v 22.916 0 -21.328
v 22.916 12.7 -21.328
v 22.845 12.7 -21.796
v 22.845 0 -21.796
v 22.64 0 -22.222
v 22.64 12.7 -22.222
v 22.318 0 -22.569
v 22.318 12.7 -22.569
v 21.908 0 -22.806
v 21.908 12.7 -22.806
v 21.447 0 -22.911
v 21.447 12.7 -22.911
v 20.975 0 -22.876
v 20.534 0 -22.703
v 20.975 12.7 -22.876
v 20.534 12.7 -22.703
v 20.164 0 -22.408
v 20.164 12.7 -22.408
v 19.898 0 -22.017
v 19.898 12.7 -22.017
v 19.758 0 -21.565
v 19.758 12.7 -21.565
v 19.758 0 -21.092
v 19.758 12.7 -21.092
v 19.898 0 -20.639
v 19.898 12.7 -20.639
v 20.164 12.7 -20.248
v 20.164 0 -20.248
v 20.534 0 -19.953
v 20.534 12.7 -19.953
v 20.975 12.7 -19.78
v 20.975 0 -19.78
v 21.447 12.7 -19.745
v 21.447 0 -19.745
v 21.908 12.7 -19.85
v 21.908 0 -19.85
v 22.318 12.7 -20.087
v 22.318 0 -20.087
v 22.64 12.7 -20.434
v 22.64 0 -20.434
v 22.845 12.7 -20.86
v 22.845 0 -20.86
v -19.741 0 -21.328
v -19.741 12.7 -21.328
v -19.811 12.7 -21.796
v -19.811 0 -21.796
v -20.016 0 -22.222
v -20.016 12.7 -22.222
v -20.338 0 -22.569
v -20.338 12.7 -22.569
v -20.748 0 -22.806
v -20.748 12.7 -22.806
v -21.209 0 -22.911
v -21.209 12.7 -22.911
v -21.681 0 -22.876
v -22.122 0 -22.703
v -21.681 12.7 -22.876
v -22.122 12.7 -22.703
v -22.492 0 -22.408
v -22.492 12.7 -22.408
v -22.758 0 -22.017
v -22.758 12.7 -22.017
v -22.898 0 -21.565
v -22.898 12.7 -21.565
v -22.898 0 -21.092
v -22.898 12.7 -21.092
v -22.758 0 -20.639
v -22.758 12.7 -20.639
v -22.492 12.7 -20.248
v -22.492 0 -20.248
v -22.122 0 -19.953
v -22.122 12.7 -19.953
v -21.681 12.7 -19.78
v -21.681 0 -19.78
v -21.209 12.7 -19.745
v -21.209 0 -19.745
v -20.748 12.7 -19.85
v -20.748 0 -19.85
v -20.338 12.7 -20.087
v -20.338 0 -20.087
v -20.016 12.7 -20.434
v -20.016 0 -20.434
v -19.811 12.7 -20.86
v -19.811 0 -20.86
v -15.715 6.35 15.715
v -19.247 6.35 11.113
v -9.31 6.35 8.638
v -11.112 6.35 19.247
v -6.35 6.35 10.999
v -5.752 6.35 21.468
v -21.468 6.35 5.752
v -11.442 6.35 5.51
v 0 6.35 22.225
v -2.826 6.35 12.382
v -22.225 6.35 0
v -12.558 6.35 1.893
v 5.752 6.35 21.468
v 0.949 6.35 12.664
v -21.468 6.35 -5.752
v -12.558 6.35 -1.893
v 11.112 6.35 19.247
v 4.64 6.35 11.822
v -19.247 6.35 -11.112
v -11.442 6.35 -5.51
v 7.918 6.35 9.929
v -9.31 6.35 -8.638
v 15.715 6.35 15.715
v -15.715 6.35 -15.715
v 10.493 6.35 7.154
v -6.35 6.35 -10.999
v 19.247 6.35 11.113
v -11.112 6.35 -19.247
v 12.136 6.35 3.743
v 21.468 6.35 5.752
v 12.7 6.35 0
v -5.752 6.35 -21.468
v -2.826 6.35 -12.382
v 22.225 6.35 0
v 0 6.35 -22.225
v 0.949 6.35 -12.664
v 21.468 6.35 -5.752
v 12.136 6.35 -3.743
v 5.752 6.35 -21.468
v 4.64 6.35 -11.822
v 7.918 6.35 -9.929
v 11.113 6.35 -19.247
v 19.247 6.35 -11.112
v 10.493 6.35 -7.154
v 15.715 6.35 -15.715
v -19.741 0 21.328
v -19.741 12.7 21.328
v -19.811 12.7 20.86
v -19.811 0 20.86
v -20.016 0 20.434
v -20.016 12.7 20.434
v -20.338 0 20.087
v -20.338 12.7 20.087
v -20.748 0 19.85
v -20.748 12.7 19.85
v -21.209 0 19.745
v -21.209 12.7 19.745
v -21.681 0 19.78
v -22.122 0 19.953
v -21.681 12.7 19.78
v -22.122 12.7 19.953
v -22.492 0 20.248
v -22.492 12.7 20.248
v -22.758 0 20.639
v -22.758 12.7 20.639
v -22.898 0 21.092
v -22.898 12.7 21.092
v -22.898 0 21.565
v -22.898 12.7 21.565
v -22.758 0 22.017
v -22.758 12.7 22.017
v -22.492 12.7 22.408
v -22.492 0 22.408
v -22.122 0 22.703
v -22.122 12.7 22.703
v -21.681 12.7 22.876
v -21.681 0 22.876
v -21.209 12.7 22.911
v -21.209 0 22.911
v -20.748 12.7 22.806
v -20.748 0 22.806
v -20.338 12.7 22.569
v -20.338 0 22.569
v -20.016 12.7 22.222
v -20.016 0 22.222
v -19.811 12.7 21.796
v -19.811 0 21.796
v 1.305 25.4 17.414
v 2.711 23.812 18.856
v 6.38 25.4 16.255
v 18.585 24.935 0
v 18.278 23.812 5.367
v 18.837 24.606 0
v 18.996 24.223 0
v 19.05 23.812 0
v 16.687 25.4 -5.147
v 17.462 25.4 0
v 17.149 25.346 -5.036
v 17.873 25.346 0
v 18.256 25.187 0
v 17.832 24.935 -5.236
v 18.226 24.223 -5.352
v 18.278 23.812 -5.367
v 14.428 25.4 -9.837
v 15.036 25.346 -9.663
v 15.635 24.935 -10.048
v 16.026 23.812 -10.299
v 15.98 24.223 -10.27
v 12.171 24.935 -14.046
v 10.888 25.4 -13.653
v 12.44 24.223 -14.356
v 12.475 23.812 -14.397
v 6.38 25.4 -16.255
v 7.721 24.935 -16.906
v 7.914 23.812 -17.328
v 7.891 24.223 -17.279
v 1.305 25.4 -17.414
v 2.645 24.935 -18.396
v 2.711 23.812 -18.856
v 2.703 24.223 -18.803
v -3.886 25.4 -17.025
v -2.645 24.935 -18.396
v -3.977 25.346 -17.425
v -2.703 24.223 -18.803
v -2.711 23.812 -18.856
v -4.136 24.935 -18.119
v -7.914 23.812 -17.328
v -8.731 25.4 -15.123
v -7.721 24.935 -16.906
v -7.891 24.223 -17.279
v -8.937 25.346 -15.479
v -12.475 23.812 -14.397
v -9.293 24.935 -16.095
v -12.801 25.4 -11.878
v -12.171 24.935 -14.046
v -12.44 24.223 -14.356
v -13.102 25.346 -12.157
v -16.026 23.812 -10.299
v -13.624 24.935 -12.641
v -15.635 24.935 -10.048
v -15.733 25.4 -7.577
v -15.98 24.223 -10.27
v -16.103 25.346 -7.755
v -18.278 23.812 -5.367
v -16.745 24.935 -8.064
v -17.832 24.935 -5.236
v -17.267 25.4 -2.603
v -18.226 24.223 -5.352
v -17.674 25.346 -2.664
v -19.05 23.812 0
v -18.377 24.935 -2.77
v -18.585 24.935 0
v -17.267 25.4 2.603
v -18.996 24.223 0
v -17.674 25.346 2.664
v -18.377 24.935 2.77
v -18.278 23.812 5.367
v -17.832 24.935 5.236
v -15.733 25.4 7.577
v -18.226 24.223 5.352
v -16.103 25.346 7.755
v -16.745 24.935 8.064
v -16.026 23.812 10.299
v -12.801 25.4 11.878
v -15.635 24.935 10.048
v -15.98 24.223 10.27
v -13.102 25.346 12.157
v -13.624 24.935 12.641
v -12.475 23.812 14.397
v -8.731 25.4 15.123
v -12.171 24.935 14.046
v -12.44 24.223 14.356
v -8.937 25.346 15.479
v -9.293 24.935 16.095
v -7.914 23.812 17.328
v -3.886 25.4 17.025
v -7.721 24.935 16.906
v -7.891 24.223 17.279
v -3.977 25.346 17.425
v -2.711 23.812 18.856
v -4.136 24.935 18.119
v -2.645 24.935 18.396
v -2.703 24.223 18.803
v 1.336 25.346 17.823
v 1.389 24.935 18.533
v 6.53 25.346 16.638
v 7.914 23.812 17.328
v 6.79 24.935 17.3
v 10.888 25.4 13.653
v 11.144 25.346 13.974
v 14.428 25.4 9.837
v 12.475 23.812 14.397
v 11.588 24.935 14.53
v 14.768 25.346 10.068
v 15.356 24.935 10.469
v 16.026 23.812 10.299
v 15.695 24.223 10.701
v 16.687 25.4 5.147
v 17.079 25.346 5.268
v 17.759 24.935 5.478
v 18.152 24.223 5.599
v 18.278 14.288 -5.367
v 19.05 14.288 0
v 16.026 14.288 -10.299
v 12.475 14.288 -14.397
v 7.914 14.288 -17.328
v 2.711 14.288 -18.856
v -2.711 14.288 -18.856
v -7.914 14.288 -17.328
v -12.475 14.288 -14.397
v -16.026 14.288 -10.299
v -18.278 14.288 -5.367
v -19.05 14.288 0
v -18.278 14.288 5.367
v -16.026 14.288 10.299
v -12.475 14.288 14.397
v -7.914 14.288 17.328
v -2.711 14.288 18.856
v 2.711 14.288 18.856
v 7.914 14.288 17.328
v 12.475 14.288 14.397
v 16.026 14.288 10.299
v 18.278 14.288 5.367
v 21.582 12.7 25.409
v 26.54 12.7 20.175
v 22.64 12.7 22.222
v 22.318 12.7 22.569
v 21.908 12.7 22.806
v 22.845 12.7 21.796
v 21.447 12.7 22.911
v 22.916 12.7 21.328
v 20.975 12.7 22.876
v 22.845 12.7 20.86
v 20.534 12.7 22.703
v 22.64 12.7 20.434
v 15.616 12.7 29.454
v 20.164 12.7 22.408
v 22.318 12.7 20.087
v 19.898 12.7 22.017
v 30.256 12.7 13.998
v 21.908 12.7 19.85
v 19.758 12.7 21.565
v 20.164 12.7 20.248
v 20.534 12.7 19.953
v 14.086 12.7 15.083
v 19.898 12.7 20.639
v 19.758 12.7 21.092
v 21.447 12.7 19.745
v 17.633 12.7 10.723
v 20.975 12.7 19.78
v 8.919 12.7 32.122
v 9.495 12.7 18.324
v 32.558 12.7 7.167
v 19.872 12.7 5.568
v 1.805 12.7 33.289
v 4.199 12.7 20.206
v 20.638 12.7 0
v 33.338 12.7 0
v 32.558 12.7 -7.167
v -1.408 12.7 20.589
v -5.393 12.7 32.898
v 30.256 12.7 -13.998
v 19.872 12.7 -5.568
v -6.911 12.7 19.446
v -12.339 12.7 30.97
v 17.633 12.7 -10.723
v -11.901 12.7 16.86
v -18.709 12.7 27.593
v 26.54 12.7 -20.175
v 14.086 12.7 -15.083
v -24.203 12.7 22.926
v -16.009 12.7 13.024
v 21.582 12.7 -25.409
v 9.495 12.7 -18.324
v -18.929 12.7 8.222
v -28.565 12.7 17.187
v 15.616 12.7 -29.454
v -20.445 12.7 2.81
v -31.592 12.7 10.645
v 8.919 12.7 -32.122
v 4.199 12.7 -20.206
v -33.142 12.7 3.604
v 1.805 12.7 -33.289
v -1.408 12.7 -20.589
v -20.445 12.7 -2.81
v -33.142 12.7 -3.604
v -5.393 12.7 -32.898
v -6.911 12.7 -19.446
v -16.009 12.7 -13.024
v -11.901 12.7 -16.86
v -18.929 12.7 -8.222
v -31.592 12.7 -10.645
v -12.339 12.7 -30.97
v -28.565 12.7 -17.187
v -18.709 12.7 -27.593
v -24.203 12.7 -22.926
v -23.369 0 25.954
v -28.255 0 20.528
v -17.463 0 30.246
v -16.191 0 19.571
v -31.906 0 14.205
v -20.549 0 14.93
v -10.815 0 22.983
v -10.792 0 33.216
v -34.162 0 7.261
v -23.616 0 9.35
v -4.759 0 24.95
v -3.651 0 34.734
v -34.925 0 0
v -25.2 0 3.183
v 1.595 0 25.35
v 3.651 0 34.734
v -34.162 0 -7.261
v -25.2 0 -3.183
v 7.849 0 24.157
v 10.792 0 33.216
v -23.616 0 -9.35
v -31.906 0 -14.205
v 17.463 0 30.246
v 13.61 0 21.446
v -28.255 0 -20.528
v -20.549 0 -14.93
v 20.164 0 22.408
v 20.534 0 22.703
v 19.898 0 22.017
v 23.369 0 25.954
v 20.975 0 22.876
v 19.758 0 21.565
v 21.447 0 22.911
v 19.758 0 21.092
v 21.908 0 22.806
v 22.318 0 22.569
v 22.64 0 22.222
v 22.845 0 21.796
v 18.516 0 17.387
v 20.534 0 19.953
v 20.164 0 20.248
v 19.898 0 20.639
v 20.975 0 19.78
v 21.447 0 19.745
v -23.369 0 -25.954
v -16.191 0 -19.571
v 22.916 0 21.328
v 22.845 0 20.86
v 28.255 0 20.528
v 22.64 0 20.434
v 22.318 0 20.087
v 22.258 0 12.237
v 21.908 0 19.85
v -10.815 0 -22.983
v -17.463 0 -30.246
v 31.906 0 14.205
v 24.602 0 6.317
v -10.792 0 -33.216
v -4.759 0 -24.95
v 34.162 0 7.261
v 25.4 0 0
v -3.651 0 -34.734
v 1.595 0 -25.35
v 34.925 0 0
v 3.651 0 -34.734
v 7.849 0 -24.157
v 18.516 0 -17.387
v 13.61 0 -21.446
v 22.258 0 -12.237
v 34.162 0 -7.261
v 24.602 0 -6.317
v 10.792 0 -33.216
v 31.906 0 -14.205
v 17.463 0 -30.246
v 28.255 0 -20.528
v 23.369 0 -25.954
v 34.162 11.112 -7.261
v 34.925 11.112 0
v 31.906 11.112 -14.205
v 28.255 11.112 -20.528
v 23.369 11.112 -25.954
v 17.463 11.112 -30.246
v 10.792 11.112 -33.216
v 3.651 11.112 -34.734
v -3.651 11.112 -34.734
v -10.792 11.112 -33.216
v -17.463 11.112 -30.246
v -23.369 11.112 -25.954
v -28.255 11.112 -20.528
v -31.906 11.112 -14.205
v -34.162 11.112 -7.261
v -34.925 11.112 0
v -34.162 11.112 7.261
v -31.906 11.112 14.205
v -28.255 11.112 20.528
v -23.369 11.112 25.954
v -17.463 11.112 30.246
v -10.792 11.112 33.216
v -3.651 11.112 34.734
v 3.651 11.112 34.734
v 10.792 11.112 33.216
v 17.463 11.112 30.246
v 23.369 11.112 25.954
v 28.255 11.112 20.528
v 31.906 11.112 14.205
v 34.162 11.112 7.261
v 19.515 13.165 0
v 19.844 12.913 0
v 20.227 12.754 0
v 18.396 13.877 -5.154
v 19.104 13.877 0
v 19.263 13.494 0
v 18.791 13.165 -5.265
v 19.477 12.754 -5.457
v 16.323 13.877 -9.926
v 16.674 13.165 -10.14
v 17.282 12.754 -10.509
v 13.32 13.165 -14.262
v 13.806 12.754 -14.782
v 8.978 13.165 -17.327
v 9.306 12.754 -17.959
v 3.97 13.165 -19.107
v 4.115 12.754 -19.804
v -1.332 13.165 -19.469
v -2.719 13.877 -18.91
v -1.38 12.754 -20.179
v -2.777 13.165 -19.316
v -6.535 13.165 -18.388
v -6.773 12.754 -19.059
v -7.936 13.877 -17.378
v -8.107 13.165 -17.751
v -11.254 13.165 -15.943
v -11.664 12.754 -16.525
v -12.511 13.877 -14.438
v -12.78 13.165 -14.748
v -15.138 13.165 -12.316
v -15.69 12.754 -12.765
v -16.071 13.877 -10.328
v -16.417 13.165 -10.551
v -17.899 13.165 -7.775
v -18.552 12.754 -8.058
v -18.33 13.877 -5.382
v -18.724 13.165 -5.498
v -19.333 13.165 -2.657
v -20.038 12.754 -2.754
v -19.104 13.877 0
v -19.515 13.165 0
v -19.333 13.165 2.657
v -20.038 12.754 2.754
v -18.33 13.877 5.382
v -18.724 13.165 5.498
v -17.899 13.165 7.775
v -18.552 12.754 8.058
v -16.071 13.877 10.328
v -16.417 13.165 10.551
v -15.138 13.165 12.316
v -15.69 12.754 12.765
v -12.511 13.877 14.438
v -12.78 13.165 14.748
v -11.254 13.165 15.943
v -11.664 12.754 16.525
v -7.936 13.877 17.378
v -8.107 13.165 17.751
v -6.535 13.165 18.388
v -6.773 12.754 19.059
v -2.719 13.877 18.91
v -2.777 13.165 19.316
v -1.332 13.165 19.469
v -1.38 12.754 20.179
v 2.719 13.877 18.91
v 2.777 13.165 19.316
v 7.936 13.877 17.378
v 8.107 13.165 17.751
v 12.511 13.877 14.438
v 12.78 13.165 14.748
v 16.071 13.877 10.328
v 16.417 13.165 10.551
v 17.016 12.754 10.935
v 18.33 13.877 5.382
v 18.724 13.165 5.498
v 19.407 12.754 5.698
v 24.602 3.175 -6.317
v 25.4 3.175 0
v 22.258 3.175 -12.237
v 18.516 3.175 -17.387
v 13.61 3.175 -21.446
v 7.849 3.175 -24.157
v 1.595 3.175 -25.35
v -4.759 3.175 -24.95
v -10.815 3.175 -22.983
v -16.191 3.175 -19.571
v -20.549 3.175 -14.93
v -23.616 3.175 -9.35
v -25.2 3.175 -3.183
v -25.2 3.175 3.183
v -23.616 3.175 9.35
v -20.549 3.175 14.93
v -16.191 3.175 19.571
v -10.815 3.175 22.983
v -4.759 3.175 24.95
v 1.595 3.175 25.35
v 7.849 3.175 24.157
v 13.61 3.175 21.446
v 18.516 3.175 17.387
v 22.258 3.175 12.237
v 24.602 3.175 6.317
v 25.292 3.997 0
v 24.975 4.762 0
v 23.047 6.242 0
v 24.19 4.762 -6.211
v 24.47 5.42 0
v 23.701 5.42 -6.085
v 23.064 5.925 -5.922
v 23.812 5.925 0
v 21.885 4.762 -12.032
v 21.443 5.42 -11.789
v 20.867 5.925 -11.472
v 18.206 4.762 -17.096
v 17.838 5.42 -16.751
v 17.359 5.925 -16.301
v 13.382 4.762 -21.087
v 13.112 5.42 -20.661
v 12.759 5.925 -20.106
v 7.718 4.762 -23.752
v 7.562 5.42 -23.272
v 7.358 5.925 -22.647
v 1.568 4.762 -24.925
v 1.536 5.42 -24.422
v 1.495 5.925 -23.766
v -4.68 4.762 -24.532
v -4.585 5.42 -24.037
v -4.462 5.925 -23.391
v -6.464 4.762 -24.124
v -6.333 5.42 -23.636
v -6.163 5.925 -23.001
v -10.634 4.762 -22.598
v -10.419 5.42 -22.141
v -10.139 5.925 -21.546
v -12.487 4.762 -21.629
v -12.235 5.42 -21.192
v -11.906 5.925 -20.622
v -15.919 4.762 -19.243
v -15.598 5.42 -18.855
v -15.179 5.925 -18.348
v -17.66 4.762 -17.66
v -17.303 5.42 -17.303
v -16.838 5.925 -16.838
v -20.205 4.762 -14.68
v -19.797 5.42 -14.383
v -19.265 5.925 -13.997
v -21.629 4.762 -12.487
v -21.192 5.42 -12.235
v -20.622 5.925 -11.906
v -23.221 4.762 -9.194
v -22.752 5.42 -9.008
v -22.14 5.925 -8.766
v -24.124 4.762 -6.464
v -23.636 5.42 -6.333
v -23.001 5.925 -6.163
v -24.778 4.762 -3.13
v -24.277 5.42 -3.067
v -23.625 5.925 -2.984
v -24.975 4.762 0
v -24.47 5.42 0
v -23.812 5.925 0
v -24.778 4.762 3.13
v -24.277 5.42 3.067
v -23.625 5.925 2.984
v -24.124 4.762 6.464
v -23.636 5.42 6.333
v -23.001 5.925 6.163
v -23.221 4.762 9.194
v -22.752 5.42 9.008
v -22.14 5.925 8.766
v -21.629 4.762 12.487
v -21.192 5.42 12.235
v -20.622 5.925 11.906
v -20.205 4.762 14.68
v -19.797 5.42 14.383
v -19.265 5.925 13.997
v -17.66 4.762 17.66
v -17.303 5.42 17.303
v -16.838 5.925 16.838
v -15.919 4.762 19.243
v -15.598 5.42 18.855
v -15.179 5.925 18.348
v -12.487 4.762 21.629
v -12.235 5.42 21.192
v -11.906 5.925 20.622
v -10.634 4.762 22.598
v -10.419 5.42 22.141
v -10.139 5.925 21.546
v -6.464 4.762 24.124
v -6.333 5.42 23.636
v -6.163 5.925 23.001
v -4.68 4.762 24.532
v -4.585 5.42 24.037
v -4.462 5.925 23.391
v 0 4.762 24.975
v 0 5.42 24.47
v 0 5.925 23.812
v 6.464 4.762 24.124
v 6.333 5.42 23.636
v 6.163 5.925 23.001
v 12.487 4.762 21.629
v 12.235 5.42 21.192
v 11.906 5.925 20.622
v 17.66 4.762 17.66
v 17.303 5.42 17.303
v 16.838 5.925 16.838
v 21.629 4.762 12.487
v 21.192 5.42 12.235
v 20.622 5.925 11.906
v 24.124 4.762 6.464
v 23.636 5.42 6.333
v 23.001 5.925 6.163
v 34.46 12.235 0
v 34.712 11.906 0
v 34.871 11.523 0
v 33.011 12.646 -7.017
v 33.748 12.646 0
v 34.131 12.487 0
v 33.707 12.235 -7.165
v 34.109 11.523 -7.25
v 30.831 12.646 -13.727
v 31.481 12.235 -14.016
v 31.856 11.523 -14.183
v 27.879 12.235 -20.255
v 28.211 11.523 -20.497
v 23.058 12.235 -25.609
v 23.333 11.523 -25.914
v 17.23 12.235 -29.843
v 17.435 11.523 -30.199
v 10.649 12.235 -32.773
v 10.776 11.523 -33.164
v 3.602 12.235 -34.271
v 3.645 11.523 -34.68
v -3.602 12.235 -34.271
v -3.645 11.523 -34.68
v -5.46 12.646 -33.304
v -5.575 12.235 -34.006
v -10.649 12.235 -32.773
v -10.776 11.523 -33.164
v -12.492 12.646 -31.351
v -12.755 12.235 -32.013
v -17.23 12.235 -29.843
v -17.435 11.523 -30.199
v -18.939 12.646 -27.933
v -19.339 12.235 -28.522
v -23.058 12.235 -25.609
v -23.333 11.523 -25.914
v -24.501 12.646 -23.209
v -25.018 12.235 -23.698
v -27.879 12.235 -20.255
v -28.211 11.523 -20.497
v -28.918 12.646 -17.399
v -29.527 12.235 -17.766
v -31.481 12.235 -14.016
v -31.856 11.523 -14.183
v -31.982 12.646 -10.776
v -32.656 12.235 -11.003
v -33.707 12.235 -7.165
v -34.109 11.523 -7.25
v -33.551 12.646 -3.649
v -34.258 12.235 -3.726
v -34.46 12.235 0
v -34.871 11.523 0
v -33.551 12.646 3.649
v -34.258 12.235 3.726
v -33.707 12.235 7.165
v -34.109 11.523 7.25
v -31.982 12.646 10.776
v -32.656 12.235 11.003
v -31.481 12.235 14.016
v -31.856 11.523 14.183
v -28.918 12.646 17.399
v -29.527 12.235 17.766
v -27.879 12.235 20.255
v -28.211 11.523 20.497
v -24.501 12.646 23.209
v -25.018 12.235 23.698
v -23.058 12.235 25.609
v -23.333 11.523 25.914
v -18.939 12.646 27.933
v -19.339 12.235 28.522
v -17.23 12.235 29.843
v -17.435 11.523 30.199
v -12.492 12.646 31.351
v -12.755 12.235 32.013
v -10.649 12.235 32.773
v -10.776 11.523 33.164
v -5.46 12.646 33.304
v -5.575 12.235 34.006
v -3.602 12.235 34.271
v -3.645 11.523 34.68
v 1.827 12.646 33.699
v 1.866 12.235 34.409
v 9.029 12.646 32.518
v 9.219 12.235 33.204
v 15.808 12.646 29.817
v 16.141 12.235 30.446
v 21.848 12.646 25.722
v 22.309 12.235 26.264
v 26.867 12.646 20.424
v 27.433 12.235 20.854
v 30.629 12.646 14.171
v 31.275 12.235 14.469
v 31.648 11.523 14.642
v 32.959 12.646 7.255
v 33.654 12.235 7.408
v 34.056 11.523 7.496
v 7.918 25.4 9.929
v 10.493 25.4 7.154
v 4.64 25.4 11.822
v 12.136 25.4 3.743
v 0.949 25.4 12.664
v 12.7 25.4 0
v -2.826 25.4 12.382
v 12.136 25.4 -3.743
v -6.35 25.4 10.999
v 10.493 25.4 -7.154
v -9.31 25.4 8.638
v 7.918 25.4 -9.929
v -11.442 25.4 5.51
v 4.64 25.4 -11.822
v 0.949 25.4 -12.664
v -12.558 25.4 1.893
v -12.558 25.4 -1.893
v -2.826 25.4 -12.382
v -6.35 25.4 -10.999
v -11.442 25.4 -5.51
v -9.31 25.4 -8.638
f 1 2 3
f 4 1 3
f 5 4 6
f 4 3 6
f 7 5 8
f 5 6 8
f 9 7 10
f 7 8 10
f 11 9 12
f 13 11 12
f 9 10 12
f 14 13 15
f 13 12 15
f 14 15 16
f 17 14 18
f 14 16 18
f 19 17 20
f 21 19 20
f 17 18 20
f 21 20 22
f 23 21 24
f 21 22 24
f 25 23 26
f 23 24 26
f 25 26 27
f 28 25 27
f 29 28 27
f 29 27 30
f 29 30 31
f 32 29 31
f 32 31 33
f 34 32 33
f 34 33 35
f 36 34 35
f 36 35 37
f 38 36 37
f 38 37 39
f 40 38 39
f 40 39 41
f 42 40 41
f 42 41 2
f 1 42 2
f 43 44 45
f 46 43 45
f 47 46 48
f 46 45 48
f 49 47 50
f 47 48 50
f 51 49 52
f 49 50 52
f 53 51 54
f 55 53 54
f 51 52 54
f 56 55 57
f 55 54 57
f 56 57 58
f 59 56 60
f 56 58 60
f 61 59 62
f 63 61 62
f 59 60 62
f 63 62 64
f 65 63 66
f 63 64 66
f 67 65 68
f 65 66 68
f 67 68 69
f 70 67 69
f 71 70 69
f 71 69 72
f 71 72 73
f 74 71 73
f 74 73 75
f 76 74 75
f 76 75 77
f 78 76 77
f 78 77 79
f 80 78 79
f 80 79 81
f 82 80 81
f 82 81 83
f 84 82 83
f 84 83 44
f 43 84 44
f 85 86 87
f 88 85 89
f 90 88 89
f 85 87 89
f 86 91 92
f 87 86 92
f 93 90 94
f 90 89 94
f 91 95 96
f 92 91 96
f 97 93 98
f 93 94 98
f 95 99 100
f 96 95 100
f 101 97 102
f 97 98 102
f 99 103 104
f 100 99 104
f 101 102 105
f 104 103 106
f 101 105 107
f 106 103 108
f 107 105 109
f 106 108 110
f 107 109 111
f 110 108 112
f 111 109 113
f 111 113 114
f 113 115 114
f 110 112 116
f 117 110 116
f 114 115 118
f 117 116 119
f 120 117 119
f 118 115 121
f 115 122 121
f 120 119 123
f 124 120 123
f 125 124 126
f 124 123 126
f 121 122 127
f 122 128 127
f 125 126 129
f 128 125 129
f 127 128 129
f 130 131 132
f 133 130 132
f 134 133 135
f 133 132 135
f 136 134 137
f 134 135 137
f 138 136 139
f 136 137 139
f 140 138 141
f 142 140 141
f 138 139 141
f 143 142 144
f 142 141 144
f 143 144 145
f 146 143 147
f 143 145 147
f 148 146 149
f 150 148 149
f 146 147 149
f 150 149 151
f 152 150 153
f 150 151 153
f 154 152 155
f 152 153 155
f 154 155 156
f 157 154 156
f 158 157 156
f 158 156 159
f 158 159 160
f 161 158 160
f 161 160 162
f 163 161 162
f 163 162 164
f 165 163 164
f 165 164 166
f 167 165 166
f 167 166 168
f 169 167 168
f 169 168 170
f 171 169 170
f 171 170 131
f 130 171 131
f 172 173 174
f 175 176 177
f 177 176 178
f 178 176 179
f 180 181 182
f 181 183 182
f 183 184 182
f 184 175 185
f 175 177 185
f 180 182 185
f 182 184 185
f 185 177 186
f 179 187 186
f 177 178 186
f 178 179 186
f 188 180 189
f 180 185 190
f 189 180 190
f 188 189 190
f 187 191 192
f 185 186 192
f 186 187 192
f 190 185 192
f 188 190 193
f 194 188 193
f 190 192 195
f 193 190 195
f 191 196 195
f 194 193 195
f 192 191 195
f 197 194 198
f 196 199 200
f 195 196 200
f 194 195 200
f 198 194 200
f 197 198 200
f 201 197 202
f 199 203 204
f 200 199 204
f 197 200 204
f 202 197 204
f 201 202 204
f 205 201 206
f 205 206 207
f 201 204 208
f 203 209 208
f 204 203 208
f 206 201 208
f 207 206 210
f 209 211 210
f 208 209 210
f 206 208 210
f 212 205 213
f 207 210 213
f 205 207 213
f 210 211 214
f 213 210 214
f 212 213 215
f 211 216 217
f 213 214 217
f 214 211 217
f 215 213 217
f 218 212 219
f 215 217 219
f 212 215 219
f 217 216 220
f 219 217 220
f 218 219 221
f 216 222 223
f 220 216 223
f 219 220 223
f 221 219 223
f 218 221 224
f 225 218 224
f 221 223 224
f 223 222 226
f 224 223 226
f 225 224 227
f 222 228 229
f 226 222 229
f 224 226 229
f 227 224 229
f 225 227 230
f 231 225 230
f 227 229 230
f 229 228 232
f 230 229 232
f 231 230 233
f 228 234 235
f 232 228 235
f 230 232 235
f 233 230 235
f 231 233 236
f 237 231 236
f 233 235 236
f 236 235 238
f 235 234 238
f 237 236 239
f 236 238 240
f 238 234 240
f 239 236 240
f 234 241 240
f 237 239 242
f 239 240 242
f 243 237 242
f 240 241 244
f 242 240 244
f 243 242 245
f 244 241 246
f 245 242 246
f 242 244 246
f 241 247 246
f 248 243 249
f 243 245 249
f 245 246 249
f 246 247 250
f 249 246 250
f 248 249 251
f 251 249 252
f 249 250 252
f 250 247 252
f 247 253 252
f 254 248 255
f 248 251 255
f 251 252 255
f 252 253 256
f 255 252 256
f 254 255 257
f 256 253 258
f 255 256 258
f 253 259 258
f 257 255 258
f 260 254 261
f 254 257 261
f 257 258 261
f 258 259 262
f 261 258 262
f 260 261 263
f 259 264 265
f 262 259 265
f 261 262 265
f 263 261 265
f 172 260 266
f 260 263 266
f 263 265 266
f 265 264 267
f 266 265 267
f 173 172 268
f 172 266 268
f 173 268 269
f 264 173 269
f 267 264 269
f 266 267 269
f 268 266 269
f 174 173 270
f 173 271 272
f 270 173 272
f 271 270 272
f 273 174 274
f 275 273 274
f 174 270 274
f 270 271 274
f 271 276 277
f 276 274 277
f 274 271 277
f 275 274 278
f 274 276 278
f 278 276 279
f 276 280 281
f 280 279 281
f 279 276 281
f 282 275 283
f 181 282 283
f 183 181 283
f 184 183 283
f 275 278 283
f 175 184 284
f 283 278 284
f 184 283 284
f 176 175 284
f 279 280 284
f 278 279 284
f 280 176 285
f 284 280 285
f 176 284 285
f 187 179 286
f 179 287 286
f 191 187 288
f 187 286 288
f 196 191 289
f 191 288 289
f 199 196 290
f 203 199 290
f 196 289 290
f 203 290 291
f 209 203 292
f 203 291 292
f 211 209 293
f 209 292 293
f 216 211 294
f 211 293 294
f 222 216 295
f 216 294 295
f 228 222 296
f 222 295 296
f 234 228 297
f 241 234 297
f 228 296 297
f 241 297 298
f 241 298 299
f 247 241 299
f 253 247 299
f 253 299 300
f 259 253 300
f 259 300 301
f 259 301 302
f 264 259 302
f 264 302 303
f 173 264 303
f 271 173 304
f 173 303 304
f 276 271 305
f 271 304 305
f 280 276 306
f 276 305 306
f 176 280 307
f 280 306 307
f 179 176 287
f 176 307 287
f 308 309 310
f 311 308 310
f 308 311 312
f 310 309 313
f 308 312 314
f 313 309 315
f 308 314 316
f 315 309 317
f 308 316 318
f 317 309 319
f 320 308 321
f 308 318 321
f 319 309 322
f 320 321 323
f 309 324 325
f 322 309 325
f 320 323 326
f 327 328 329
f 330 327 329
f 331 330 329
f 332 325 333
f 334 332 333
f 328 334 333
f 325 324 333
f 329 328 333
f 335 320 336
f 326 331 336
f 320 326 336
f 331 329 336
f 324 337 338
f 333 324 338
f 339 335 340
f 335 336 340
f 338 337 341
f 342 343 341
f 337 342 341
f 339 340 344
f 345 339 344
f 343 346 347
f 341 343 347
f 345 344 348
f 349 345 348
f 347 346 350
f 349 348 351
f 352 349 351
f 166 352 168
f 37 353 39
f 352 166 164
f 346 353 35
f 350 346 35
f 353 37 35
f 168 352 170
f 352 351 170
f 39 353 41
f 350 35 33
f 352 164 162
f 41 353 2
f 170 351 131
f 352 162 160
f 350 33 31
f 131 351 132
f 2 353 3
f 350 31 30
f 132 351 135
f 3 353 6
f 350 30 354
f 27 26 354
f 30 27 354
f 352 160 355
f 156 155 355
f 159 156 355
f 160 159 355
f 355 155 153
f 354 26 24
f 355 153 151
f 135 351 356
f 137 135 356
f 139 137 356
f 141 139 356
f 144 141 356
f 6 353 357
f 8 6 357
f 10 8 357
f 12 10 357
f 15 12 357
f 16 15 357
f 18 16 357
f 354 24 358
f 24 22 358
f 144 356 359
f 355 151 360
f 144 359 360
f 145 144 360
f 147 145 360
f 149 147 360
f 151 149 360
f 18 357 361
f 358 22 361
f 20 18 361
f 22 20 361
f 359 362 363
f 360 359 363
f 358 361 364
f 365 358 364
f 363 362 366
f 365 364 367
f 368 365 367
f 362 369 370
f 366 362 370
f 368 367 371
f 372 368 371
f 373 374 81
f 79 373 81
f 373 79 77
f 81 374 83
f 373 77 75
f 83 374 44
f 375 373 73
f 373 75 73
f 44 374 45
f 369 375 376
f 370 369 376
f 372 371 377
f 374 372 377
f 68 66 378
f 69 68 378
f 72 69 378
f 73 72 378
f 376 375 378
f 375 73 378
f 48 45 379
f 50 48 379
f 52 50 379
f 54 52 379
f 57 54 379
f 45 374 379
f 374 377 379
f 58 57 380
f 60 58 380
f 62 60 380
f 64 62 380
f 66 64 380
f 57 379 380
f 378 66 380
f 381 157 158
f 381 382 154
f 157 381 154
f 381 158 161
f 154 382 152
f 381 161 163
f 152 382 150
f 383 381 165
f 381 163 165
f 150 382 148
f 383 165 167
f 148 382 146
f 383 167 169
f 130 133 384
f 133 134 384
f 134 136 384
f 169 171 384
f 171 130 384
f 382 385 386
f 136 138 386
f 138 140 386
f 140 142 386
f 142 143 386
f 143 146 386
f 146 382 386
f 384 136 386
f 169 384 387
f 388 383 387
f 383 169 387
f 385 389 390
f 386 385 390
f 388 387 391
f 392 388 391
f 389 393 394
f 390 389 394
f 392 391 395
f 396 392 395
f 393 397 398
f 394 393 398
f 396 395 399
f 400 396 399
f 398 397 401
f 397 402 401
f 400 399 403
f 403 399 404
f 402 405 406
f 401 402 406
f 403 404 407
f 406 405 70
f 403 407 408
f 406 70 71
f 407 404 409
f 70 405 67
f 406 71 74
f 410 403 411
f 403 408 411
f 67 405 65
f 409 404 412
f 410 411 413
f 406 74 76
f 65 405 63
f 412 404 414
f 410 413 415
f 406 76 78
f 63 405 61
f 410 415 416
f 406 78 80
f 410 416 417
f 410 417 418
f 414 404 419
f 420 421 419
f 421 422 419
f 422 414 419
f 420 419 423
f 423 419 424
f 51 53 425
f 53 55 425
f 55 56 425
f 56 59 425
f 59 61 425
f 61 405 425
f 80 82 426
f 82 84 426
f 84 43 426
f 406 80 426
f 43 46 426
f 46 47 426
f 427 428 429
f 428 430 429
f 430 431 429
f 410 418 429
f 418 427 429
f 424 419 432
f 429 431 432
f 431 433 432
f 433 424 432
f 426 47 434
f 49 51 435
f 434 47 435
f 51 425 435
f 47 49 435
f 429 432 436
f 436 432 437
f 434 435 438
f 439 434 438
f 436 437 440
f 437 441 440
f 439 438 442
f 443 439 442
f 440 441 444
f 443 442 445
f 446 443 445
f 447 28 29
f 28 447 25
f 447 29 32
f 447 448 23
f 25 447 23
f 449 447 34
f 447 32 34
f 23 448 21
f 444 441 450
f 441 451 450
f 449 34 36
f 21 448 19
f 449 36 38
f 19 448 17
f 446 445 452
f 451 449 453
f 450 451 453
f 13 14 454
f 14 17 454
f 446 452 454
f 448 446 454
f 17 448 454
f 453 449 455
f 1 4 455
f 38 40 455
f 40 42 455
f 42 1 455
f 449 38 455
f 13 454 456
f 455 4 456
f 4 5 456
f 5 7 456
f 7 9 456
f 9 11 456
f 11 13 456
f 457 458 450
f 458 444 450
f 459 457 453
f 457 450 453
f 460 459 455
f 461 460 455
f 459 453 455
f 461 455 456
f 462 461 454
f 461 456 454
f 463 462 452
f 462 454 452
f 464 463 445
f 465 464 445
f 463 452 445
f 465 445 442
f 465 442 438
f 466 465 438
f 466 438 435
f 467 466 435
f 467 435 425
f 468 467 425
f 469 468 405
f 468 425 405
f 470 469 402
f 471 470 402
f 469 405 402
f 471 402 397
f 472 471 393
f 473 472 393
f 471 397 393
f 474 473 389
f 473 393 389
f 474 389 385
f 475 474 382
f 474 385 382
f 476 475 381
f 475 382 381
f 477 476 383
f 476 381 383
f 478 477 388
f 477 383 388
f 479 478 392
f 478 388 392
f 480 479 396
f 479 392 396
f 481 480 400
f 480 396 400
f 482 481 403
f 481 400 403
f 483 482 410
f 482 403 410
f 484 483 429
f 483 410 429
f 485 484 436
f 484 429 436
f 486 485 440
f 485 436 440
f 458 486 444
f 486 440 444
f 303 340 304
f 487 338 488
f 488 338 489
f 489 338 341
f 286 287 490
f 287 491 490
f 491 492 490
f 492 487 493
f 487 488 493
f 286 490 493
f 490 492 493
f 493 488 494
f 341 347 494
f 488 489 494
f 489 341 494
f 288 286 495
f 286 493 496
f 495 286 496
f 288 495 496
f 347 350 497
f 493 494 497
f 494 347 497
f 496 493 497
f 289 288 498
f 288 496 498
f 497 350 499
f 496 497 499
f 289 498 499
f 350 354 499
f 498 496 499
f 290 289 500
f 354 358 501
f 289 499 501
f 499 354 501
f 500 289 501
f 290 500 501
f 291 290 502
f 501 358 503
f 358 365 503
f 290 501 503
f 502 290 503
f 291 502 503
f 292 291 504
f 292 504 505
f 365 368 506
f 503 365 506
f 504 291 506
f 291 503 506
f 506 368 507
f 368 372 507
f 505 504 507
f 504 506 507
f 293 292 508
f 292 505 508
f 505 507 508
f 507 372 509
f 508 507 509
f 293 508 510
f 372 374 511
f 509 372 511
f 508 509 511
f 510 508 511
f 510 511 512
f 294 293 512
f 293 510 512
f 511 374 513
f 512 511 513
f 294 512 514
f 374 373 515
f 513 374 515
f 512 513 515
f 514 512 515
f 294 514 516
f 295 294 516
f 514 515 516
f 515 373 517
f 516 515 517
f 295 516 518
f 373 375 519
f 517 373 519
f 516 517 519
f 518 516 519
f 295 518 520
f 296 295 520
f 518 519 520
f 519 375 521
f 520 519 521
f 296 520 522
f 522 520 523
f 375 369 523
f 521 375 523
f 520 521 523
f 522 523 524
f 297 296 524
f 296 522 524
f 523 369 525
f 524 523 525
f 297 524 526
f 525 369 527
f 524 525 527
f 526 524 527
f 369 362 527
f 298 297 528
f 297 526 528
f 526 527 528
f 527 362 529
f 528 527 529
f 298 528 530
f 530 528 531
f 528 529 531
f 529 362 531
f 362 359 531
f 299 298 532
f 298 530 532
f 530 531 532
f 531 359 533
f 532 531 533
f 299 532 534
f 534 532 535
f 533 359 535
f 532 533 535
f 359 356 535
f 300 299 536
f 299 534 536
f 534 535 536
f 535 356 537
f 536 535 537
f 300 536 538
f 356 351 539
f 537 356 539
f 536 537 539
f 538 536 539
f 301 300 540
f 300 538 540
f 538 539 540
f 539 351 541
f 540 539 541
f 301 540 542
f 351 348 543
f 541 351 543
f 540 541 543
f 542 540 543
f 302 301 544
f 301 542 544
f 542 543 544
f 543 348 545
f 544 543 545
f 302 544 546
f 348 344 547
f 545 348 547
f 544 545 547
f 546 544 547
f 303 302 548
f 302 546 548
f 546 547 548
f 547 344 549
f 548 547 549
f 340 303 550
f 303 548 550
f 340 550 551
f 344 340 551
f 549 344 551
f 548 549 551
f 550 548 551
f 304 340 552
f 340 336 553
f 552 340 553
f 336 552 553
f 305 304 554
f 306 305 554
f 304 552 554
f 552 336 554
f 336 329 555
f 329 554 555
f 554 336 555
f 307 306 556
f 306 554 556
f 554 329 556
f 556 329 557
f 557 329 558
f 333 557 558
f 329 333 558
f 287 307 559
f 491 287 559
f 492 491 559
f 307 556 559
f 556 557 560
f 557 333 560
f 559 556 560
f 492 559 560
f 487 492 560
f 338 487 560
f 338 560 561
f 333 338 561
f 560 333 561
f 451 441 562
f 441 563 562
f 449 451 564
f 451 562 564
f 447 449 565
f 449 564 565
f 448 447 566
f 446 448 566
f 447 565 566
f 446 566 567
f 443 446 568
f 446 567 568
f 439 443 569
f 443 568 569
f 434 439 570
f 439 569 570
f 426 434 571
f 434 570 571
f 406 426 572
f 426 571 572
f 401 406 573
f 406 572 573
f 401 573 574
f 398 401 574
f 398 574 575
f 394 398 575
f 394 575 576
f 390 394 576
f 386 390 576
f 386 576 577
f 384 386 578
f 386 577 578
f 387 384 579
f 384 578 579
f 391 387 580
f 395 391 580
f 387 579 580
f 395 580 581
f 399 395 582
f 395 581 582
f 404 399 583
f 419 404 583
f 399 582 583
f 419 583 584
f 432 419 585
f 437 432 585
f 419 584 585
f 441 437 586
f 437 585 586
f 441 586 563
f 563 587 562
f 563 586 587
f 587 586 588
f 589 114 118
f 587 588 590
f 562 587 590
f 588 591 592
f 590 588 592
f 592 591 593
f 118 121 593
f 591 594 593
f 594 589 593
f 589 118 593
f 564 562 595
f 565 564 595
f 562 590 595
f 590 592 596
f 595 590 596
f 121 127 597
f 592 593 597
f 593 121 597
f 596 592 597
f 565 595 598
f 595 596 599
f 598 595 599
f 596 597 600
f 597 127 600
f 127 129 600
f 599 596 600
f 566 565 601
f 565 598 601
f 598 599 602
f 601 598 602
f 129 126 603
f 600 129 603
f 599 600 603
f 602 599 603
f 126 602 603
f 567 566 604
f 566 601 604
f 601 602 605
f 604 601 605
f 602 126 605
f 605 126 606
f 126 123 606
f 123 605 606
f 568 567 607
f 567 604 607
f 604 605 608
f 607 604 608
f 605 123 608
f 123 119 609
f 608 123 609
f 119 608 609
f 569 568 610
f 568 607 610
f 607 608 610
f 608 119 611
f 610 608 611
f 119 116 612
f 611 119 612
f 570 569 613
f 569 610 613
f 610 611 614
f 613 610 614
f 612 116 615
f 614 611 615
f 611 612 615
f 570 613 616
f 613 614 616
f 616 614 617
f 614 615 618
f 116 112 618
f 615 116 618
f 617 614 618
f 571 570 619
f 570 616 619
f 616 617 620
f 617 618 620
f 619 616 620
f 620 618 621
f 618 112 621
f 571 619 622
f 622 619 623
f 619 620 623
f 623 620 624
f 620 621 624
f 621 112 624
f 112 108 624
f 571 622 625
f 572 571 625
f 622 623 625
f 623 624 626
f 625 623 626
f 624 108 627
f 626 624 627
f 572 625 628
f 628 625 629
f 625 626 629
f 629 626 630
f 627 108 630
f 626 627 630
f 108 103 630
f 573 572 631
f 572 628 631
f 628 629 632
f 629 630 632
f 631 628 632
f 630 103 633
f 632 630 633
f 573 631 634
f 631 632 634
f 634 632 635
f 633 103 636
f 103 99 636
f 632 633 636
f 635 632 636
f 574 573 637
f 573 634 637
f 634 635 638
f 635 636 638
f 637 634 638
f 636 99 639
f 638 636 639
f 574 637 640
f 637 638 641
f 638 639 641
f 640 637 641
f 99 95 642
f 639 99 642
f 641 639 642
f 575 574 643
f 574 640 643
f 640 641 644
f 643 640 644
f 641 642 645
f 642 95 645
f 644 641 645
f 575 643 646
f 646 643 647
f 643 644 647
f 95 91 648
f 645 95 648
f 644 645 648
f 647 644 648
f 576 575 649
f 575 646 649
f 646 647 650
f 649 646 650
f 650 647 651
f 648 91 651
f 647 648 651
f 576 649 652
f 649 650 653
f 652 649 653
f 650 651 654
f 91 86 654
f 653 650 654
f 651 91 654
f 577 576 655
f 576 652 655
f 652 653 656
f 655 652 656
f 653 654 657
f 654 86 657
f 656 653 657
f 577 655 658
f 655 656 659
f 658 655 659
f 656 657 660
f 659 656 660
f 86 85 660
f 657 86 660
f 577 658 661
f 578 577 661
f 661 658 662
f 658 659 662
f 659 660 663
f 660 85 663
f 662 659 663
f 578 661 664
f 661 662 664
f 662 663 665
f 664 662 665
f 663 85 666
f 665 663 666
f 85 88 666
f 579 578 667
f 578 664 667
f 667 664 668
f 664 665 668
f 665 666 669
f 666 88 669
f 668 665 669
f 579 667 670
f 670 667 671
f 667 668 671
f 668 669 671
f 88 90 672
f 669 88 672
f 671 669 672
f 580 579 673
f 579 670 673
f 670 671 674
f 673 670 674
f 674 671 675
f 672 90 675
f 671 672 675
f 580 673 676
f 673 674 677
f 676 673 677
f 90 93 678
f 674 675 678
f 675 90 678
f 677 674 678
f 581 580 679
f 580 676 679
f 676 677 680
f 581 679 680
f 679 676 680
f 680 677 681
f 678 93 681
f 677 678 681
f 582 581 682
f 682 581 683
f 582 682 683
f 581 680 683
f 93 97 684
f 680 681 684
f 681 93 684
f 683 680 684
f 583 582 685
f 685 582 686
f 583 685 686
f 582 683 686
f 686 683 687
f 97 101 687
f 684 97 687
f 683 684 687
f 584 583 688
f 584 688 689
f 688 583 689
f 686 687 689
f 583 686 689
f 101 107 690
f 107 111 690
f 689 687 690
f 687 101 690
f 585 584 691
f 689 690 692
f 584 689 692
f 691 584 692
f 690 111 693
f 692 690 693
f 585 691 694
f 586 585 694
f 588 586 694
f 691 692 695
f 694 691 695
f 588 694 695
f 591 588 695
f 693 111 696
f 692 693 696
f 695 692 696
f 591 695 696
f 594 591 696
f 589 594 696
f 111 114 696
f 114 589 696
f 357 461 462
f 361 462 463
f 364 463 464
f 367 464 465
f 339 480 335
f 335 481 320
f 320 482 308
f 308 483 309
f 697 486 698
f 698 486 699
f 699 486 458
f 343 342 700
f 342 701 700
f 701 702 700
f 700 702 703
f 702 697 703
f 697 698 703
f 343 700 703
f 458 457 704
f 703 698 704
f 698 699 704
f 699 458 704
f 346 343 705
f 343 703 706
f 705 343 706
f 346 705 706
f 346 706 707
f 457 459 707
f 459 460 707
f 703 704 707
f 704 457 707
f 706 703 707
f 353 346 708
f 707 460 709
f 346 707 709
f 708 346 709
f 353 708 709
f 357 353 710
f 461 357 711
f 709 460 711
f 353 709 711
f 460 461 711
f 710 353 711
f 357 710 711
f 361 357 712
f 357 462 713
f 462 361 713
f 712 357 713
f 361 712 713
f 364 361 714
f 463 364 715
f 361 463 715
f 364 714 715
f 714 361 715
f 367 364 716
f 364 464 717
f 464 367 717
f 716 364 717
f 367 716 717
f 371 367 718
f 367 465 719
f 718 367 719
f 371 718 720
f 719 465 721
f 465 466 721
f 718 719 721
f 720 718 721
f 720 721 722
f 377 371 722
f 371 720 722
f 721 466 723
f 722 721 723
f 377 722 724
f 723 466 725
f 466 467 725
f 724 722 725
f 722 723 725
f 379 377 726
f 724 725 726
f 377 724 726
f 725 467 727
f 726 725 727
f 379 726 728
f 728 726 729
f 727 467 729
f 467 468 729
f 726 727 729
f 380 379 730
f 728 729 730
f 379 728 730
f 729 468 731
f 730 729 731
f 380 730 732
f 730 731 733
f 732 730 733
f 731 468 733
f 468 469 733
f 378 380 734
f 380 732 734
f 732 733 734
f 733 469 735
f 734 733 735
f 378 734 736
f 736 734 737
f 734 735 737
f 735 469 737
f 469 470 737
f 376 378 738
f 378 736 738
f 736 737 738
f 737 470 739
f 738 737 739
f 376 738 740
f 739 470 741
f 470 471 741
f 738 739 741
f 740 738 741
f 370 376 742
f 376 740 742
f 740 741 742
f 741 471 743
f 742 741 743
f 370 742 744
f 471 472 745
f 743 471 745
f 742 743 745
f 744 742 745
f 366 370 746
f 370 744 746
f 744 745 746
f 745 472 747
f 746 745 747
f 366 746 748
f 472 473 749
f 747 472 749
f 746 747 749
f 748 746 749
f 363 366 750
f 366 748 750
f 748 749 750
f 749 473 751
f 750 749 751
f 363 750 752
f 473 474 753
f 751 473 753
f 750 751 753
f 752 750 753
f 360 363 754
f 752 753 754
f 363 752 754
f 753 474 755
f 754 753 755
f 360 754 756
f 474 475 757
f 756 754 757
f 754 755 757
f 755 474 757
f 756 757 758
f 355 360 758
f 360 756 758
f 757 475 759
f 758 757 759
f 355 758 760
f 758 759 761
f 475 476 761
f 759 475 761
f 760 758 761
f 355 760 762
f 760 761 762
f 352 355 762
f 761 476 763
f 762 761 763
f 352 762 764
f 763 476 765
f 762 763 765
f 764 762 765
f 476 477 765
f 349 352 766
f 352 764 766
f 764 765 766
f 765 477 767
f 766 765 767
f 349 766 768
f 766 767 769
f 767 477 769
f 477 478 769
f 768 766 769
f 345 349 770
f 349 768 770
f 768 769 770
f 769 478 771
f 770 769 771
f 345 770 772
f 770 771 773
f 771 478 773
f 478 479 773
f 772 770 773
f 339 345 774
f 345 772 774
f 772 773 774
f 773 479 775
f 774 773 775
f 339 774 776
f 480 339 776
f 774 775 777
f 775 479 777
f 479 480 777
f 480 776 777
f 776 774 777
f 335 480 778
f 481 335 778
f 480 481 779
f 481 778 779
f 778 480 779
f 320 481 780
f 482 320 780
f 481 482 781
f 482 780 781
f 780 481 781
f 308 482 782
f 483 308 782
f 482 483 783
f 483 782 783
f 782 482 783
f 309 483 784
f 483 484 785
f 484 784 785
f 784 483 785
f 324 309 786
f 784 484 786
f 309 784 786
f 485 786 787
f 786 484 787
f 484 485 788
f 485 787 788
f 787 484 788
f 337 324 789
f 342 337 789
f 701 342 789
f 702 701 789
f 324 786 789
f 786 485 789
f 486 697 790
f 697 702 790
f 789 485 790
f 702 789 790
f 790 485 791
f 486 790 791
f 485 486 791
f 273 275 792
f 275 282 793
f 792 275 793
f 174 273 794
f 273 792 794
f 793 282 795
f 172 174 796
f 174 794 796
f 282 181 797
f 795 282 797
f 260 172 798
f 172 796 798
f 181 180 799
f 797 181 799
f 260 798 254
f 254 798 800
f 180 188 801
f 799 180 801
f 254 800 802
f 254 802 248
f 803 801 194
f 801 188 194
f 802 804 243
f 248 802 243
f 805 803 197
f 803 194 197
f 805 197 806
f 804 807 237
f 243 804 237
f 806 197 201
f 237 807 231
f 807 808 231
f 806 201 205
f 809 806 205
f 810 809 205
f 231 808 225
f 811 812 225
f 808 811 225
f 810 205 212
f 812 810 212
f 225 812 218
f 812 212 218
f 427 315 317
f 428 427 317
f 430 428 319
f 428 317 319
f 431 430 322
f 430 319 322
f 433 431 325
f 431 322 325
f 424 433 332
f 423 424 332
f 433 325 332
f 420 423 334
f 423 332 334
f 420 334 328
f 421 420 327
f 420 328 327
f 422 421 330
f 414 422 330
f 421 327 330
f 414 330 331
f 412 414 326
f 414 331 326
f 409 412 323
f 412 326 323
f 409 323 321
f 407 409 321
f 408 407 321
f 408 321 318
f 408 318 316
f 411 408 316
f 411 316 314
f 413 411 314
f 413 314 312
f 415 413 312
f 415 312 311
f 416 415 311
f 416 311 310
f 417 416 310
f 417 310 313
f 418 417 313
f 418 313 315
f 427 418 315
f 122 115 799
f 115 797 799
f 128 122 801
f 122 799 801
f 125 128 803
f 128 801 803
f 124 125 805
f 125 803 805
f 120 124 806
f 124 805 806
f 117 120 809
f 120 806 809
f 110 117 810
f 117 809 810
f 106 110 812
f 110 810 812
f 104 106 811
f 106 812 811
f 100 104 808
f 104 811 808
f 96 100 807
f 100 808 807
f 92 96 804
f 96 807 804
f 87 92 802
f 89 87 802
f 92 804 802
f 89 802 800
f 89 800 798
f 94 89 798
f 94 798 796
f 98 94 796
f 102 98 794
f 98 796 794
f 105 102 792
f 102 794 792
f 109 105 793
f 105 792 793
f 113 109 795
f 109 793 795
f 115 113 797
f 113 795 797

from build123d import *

# Parameters (mm, degrees)
SKETCH2_R          = 1.5875
CUT_EXTRUDE1_DEPTH = 13.7


with BuildPart() as part:
    # Sketch1 → Revolve1 (revolve)
    with BuildSketch(Plane.XY):
        with BuildLine():
            Line((12.7, 25.4), (17.4625, 25.4))
            ThreePointArc((17.4625, 25.4), (18.585032015, 24.935032015), (19.05, 23.8125))
            Line((19.05, 23.8125), (19.05, 14.2875))
            ThreePointArc((19.05, 14.2875), (19.514967985, 13.164967985), (20.6375, 12.7))
            Line((20.6375, 12.7), (33.3375, 12.7))
            ThreePointArc((33.3375, 12.7), (34.460032015, 12.235032015), (34.925, 11.1125))
            Line((34.925, 11.1125), (34.925, 0))
            Line((34.925, 0), (25.4, 0))
            Line((25.4, 0), (25.4, 3.175))
            ThreePointArc((25.4, 3.175), (24.47006403, 5.42006403), (22.225, 6.35))
            Line((22.225, 6.35), (12.7, 6.35))
            Line((12.7, 6.35), (12.7, 25.4))
        make_face()
    revolve(axis=Axis((0, 0, 0), (0, 1, 0)))

    # Sketch2 → Cut-Extrude1 (cut, through all)
    with BuildSketch(Plane(origin=(0, 12.7, 0), x_dir=(1, 0, 0), z_dir=(0, 1, 0))):
        with Locations((-21.328108288, 21.328108288)):
            Circle(SKETCH2_R)
        with Locations((21.328108288, 21.328108288)):
            Circle(SKETCH2_R)
        with Locations((21.328108288, -21.328108288)):
            Circle(SKETCH2_R)
        with Locations((-21.328108288, -21.328108288)):
            Circle(SKETCH2_R)
    extrude(amount=-CUT_EXTRUDE1_DEPTH, mode=Mode.SUBTRACT)


solid = part.part
